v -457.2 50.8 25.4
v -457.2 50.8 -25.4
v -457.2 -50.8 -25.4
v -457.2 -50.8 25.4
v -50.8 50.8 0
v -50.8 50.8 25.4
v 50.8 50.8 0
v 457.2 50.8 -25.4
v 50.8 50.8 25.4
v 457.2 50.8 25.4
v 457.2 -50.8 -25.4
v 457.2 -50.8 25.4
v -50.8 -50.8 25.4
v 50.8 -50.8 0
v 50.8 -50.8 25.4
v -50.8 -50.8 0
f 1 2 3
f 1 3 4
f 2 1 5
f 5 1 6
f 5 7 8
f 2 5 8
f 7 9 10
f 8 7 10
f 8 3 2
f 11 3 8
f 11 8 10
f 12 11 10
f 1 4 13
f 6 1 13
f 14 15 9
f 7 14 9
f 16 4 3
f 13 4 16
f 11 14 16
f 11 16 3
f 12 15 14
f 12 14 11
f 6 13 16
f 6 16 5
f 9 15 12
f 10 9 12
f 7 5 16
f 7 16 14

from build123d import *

# Parameters (mm, degrees)
F0_W     = 914.4
F0_H     = 50.8
F1_DEPTH = 50.8
F2_W     = 101.6
F2_H     = 101.6
F3_DEPTH = 25.4


with BuildPart() as f1:
    # F0 (on Front) → F1 (new body, symmetric)
    with BuildSketch(Plane.XZ):
        Rectangle(F0_W, F0_H)
    extrude(amount=F1_DEPTH, both=True)

    # F2 (on face) → F3 (cut)
    with BuildSketch(Plane.XY.offset(25.4)):
        Rectangle(F2_W, F2_H)
    extrude(amount=-F3_DEPTH, mode=Mode.SUBTRACT)


solid = f1.part
